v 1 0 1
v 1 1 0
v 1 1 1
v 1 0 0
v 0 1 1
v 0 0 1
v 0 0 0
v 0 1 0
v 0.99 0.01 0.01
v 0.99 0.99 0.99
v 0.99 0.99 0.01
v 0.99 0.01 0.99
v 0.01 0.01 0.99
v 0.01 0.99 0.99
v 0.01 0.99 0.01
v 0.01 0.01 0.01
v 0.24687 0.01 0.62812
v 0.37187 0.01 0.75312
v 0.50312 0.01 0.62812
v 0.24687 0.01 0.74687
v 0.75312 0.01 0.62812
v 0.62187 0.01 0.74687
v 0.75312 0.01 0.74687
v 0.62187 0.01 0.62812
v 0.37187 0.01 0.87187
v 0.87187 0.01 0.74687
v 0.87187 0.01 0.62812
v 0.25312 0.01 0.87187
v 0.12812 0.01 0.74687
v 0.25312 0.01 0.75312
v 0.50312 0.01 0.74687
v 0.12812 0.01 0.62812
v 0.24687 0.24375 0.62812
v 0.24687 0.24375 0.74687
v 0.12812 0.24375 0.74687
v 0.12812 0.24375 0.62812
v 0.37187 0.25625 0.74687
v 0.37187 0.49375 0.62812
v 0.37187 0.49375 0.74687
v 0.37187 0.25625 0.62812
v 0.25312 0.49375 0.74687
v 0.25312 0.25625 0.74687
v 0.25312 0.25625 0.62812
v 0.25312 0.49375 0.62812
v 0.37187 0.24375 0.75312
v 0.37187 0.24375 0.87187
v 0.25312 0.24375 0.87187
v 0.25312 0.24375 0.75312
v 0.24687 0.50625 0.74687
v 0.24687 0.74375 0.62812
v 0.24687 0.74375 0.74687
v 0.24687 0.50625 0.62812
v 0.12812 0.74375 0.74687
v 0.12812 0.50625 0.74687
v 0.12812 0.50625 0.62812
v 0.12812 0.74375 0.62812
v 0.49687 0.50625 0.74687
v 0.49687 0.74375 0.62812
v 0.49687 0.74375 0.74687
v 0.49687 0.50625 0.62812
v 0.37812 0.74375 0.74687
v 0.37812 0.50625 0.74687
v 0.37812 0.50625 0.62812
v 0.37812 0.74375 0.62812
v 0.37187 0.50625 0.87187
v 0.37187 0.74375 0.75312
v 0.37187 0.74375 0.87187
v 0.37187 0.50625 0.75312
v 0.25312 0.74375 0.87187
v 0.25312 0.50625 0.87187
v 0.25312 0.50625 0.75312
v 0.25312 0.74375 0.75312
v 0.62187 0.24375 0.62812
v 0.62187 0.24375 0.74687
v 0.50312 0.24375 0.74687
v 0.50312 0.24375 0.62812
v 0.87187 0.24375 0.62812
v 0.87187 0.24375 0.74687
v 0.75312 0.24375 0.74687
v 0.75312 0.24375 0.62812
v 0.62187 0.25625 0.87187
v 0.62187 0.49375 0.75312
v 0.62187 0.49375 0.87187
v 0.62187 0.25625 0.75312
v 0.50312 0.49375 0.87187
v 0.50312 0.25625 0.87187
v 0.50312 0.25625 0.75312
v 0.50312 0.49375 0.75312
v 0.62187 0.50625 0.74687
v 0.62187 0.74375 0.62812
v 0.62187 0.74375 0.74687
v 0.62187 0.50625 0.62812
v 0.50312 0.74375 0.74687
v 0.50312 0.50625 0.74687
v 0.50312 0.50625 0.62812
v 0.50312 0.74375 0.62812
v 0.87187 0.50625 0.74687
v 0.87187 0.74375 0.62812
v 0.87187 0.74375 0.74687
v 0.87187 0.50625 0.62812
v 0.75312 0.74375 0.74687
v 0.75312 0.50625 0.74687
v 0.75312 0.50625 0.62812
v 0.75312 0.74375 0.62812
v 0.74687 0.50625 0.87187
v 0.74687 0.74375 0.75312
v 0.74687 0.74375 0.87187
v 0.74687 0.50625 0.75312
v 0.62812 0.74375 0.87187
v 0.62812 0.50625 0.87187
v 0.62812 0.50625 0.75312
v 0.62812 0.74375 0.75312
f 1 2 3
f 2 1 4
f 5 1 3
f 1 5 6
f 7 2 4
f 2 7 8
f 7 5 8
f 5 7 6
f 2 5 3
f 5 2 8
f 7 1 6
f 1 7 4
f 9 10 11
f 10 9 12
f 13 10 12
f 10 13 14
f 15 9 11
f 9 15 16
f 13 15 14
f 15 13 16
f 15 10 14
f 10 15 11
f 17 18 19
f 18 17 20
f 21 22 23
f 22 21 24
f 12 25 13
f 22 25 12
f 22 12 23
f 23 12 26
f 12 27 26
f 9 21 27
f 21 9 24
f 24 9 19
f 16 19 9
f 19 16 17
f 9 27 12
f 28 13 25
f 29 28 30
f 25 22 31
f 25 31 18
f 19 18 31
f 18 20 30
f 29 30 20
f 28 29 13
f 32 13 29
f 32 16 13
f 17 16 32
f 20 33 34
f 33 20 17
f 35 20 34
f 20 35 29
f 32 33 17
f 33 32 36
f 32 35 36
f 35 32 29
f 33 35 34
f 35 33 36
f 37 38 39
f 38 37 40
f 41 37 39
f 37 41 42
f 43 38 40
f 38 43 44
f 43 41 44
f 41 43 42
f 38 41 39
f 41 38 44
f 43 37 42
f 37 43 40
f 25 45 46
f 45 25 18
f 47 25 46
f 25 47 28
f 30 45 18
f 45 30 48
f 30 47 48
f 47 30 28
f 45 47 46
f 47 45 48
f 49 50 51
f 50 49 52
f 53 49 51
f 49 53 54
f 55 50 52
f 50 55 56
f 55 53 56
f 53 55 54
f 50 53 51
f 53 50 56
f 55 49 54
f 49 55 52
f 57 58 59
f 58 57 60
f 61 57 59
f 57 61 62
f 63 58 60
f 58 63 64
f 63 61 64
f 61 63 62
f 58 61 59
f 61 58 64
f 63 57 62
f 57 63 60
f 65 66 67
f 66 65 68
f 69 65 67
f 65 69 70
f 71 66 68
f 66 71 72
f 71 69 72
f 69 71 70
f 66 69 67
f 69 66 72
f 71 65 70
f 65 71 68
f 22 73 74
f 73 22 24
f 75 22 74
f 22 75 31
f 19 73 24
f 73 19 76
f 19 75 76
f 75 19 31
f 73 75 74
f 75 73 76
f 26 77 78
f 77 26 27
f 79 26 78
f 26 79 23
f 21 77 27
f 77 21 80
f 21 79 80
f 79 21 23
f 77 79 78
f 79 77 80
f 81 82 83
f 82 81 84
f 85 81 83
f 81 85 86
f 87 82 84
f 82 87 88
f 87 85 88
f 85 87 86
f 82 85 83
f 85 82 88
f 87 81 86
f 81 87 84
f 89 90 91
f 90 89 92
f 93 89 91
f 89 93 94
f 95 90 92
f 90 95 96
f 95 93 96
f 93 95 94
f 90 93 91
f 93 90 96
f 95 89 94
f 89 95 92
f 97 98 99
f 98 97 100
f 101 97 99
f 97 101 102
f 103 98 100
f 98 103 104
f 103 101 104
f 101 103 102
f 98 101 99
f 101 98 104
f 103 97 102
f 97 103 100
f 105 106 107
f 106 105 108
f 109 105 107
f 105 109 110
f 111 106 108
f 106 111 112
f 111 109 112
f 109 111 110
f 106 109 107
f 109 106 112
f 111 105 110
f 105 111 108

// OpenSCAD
translate([0.1875, 0.125, 0.6875]) color([0.49744522261176494, 0.9757724222449635, 0.423890538730022]) cube([0.11875, 0.2375, 0.11875], center=true);
translate([0.3125, 0.375, 0.6875]) color([0.8896618665846291, 0.6649942311219297, 0.01465181752758915]) cube([0.11875, 0.2375, 0.11875], center=true);
translate([0.3125, 0.125, 0.8125]) color([0.9033500371814018, 0.7241474475818538, 0.7369300009060096]) cube([0.11875, 0.2375, 0.11875], center=true);
translate([0.1875, 0.625, 0.6875]) color([0.45964493747463897, 0.6379224962991888, 0.9416389365532426]) cube([0.11875, 0.2375, 0.11875], center=true);
translate([0.4375, 0.625, 0.6875]) color([0.09916220504549278, 0.12343700662283519, 0.5849568672929711]) cube([0.11875, 0.2375, 0.11875], center=true);
translate([0.3125, 0.625, 0.8125]) color([0.8949788340590326, 0.6426080417348385, 0.32093100284133025]) cube([0.11875, 0.2375, 0.11875], center=true);
translate([0.5625, 0.125, 0.6875]) color([0.1775547504527769, 0.33994997018494033, 0.4227076260432172]) cube([0.11875, 0.2375, 0.11875], center=true);
translate([0.8125, 0.125, 0.6875]) color([0.28446637803759456, 0.42507346280587055, 0.42811254242383723]) cube([0.11875, 0.2375, 0.11875], center=true);
translate([0.5625, 0.375, 0.8125]) color([0.18112595393104636, 0.1290271395144067, 0.45975961917827524]) cube([0.11875, 0.2375, 0.11875], center=true);
translate([0.5625, 0.625, 0.6875]) color([0.49109508547670844, 0.6878114261731333, 0.7151966483960623]) cube([0.11875, 0.2375, 0.11875], center=true);
translate([0.8125, 0.625, 0.6875]) color([0.822089290344052, 0.11964920185063355, 0.7039727907240191]) cube([0.11875, 0.2375, 0.11875], center=true);
translate([0.6875, 0.625, 0.8125]) color([0.3218795126139583, 0.9029722219281008, 0.14720171897987266]) cube([0.11875, 0.2375, 0.11875], center=true);
color([0.3,0.3,0.3,0.3]) difference() { cube([1,1,1]); translate([0.01,0.01,0.01]) cube([0.98,0.98,0.98]); }
